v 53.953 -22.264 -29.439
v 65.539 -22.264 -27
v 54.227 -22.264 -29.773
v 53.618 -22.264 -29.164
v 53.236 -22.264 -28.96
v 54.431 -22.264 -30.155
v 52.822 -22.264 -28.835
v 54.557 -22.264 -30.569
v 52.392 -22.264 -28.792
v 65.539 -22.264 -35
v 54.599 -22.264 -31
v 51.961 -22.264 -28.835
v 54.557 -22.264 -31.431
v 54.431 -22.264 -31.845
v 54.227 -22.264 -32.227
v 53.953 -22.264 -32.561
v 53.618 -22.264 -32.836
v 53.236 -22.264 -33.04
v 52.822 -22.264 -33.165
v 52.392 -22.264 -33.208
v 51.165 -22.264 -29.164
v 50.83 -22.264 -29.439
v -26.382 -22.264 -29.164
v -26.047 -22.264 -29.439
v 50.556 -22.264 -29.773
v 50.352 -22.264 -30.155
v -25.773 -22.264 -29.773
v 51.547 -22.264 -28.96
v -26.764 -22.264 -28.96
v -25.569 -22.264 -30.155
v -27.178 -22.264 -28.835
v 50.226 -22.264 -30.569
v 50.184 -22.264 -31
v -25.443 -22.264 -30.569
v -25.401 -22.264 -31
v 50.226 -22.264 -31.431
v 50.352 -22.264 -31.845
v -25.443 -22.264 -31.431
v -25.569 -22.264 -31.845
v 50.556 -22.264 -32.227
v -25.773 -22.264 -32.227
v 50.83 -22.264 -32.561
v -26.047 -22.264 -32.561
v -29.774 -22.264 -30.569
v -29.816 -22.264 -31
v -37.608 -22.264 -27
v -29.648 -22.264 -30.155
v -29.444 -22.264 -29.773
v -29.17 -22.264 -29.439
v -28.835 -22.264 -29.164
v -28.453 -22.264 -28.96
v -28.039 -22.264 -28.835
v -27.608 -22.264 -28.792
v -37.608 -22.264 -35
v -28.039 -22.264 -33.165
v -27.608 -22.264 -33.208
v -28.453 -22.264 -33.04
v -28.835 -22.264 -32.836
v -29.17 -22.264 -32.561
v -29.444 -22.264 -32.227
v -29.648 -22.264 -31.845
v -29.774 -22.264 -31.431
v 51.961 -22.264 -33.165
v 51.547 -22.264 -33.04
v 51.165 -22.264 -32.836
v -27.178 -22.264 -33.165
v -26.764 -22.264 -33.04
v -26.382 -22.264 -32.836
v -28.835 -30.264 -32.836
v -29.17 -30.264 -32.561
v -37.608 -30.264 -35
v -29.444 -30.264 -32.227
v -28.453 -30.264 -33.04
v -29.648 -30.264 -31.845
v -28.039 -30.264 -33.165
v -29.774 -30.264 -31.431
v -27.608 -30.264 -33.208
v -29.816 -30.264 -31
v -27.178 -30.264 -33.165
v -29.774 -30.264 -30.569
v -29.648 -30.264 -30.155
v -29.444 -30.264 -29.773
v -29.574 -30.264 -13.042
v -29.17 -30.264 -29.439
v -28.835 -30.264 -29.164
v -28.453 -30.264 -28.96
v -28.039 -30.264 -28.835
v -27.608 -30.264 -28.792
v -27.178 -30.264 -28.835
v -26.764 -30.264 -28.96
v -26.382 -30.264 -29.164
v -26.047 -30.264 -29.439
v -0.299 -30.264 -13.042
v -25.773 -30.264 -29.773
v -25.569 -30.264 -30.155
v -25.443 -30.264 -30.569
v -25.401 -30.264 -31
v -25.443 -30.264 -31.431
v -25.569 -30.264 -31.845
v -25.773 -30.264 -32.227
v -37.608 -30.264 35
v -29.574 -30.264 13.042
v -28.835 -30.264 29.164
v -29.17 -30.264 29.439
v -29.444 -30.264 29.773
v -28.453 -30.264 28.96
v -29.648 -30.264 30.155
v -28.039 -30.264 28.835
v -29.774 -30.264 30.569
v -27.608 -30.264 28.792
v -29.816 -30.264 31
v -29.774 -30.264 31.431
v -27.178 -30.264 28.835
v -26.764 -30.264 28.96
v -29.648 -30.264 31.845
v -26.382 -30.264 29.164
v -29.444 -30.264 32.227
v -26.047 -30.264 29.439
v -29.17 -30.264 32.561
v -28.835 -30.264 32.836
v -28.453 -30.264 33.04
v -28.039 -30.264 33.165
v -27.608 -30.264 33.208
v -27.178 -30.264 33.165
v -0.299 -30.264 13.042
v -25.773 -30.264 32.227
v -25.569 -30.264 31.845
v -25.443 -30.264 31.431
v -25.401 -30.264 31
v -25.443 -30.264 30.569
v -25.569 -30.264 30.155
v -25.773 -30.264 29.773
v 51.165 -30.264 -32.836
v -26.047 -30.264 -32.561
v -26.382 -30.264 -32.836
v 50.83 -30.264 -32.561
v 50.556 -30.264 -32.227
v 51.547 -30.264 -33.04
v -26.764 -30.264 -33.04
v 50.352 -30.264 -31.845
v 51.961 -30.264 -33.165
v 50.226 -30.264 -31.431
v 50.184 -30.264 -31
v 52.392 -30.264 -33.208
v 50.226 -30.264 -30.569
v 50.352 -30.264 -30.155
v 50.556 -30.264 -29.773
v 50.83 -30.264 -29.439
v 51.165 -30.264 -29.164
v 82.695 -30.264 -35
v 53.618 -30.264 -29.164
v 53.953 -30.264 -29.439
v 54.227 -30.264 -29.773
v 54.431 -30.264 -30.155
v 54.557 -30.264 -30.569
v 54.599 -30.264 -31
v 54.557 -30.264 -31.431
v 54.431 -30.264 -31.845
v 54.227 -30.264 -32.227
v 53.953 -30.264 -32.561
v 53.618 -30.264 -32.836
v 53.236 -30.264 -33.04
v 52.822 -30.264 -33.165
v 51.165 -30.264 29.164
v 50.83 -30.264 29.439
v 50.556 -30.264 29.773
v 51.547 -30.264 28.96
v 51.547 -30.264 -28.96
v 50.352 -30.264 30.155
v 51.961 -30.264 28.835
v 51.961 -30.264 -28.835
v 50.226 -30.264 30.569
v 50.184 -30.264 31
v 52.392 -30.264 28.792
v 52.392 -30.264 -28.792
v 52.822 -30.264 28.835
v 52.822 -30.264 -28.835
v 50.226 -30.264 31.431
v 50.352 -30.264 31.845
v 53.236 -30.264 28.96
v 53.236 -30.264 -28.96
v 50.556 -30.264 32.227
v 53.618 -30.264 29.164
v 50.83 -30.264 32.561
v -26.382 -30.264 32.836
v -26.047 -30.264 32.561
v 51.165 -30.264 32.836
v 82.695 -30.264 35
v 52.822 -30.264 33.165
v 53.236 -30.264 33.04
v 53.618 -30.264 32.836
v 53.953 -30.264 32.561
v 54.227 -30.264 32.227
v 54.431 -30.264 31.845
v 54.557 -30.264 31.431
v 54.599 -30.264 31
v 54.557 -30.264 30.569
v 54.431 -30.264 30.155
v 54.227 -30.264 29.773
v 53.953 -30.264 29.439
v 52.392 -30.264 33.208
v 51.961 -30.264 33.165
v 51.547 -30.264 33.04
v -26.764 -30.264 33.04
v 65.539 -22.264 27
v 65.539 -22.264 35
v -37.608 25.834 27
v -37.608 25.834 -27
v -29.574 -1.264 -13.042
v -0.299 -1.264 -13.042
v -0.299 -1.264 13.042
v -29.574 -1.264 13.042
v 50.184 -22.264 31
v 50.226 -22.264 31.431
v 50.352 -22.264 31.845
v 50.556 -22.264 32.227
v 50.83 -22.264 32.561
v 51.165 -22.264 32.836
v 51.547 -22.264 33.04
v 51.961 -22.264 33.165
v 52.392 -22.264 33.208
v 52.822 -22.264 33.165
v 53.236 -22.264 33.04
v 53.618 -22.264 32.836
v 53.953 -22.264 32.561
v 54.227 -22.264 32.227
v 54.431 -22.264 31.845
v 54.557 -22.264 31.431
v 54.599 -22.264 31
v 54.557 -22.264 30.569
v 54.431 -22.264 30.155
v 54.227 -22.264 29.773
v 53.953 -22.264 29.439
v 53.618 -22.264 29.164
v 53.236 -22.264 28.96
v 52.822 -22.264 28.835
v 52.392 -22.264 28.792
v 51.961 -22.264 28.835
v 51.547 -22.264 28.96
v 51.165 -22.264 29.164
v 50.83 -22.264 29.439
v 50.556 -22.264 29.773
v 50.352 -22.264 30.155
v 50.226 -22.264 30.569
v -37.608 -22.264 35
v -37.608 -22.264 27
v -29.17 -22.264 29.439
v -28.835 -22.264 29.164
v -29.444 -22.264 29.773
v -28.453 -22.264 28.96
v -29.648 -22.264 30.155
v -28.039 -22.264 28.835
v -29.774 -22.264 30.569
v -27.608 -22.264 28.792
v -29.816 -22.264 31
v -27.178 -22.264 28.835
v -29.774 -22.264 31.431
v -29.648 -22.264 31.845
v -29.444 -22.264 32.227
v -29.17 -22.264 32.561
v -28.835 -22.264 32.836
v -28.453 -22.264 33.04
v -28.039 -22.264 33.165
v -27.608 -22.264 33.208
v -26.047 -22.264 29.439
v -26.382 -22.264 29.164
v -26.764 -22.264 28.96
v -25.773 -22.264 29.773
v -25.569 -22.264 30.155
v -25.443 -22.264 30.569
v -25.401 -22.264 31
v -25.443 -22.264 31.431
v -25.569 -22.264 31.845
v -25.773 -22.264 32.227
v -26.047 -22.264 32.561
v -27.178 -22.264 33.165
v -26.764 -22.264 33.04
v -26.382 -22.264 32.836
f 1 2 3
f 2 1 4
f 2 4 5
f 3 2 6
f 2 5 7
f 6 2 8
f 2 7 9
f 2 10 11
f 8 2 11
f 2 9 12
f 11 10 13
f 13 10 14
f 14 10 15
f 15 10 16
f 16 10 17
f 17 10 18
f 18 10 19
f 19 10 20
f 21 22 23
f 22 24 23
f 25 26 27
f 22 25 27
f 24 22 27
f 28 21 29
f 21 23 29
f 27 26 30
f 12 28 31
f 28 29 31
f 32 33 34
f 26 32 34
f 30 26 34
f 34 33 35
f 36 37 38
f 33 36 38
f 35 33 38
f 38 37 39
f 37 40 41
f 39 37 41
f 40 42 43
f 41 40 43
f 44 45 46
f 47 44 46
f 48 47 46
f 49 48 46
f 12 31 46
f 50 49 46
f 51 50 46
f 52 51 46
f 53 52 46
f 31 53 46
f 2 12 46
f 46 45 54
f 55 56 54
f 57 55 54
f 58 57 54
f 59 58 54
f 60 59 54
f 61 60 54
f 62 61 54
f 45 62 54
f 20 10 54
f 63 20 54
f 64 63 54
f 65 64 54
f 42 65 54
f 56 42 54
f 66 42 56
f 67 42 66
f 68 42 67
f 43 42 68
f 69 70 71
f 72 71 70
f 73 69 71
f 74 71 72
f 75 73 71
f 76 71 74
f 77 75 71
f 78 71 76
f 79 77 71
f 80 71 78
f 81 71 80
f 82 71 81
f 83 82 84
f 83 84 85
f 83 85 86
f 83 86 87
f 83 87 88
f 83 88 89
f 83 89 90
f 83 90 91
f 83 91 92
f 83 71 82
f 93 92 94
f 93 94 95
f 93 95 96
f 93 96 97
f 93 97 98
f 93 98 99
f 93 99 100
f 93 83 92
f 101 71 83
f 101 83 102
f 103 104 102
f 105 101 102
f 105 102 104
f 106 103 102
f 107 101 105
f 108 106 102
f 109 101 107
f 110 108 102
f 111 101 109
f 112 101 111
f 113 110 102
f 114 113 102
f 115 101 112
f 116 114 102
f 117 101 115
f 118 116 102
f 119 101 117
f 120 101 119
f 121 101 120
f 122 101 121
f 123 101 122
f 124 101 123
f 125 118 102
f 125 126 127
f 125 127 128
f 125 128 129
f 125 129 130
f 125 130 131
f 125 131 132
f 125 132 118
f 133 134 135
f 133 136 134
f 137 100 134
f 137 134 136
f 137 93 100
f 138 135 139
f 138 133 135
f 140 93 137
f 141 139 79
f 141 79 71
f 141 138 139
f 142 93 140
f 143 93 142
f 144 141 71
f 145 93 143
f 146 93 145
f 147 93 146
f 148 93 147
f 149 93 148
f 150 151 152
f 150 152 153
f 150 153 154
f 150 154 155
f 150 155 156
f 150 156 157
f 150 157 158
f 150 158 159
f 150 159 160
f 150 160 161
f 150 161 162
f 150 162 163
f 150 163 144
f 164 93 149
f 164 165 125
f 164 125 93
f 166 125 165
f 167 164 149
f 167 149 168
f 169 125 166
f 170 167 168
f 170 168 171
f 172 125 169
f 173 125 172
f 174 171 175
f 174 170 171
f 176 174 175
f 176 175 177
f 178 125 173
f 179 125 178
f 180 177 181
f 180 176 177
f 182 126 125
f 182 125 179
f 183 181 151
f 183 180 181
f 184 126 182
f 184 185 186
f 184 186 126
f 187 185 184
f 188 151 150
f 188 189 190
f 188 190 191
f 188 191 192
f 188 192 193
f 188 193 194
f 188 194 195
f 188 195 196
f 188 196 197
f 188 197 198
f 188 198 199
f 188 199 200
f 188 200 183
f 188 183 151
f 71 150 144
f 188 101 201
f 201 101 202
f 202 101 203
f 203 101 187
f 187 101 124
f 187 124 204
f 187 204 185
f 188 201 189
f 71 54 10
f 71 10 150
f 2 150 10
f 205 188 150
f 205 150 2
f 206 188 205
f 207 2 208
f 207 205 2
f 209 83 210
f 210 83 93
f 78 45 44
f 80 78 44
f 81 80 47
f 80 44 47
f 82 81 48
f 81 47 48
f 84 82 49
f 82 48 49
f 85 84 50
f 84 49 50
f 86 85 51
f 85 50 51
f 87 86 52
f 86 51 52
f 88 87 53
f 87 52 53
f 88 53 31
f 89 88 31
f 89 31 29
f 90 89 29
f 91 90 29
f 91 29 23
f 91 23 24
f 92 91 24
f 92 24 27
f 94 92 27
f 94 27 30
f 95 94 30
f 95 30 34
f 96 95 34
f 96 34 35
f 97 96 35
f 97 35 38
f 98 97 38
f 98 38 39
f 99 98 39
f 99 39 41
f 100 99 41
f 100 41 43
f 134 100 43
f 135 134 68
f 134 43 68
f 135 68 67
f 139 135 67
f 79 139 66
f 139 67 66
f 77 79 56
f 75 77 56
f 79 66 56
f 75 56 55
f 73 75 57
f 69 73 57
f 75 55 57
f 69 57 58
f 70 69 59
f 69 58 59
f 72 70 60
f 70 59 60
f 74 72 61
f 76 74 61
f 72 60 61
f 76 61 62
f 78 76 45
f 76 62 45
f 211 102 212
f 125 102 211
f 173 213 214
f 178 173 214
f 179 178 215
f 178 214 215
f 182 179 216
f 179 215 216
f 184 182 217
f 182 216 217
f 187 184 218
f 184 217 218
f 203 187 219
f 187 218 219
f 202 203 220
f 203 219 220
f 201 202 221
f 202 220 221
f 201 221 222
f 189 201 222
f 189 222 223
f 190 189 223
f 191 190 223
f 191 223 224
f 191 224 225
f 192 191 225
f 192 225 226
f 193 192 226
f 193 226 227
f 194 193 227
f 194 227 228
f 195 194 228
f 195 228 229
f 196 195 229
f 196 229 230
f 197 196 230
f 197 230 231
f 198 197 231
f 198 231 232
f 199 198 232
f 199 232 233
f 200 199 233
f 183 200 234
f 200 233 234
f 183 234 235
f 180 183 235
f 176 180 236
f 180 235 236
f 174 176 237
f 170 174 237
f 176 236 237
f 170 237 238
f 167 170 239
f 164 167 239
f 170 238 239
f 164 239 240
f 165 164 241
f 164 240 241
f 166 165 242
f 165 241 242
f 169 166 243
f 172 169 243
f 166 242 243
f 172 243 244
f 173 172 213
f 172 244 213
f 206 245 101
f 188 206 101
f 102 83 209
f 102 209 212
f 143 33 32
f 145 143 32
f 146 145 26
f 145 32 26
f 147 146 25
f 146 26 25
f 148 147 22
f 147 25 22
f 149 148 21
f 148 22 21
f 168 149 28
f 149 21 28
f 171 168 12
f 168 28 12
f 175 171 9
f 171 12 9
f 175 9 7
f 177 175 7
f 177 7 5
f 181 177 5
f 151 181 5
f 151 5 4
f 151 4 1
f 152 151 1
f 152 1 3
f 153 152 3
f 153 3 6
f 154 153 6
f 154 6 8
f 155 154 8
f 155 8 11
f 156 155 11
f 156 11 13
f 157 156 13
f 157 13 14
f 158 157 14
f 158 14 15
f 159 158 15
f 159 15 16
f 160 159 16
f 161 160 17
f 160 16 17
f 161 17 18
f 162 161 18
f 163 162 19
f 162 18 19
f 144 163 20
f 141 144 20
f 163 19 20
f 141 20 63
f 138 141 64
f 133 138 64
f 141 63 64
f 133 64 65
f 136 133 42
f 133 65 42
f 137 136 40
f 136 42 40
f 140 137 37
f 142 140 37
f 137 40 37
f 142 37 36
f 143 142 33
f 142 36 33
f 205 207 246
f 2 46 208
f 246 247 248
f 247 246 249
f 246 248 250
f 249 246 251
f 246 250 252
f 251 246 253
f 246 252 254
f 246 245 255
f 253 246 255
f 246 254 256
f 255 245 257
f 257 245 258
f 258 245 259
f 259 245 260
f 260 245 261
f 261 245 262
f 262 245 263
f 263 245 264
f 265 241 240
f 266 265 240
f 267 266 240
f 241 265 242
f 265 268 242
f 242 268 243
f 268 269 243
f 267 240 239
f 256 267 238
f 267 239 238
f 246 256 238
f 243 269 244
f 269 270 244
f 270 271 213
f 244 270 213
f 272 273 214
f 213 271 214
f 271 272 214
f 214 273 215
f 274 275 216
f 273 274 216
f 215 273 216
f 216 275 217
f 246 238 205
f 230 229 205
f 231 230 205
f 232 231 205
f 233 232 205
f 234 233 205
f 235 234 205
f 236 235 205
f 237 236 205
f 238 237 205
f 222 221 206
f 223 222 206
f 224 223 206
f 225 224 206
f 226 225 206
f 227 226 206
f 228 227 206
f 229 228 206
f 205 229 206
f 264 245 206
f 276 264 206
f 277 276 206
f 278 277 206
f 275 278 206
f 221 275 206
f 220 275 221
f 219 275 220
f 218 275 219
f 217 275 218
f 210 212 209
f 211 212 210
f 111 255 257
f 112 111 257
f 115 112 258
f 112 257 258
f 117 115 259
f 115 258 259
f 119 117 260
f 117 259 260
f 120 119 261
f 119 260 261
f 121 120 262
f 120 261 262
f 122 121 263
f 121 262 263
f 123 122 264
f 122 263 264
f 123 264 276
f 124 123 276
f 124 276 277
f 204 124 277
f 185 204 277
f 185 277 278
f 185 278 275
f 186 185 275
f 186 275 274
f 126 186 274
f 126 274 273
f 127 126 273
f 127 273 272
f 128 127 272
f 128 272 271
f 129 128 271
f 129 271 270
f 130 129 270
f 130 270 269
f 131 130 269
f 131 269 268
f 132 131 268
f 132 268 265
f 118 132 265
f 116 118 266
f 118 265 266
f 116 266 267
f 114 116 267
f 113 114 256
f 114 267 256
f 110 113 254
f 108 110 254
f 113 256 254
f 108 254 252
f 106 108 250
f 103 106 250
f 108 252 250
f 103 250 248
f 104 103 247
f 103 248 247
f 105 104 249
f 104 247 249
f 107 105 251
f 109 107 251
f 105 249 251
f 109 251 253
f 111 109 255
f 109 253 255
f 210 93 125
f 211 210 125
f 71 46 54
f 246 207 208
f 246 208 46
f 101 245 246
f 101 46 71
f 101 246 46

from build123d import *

# Parameters (mm, degrees)
PAD_DEPTH       = 35
POCKET_DEPTH    = 8
POCKET001_DEPTH = 8
SKETCH003_R     = 2.207749
POCKET002_DEPTH = 8.001
SKETCH004_W     = 29.275187
SKETCH004_H     = 26.084862
POCKET003_DEPTH = 29


with BuildPart() as part:
    # Sketch → Pad (new body, symmetric)
    with BuildSketch(Plane.XY):
        Polygon((-37.608468, 25.834033), (-37.608468, -30.264225), (82.694635, -30.264225), align=None)
    extrude(amount=PAD_DEPTH, both=True)

    # Sketch001 → Pocket (cut)
    with BuildSketch(Plane.XY.offset(35)):
        Polygon((-37.608468, 25.834033), (-37.608468, -22.264225), (65.538579, -22.264225), align=None)
    extrude(amount=-POCKET_DEPTH, mode=Mode.SUBTRACT)

    # Sketch002 → Pocket001 (cut)
    with BuildSketch(Plane(origin=(0, 0, -35), x_dir=(1, 0, 0), z_dir=(0, 0, -1))):
        Polygon((65.538579, 22.264225), (-37.608468, 22.264225), (-37.608468, -25.834033), align=None)
    extrude(amount=-POCKET001_DEPTH, mode=Mode.SUBTRACT)

    # Sketch003 → Pocket002 (cut, through all)
    with BuildSketch(Plane(origin=(0, -22.264225, 0), x_dir=(-1, 0, 0), z_dir=(0, 1, 0))):
        with Locations((-52.391532, 31)):
            Circle(SKETCH003_R)
        with Locations((27.608468, 31)):
            Circle(SKETCH003_R)
        with Locations((-52.391532, -31)):
            Circle(SKETCH003_R)
        with Locations((27.608468, -31)):
            Circle(SKETCH003_R)
    extrude(amount=-POCKET002_DEPTH, mode=Mode.SUBTRACT)

    # Sketch004 → Pocket003 (cut)
    with BuildSketch(Plane.XZ.offset(30.264225)):
        with Locations((-14.936289, 0)):
            Rectangle(SKETCH004_W, SKETCH004_H)
    extrude(amount=-POCKET003_DEPTH, mode=Mode.SUBTRACT)


solid = part.part
